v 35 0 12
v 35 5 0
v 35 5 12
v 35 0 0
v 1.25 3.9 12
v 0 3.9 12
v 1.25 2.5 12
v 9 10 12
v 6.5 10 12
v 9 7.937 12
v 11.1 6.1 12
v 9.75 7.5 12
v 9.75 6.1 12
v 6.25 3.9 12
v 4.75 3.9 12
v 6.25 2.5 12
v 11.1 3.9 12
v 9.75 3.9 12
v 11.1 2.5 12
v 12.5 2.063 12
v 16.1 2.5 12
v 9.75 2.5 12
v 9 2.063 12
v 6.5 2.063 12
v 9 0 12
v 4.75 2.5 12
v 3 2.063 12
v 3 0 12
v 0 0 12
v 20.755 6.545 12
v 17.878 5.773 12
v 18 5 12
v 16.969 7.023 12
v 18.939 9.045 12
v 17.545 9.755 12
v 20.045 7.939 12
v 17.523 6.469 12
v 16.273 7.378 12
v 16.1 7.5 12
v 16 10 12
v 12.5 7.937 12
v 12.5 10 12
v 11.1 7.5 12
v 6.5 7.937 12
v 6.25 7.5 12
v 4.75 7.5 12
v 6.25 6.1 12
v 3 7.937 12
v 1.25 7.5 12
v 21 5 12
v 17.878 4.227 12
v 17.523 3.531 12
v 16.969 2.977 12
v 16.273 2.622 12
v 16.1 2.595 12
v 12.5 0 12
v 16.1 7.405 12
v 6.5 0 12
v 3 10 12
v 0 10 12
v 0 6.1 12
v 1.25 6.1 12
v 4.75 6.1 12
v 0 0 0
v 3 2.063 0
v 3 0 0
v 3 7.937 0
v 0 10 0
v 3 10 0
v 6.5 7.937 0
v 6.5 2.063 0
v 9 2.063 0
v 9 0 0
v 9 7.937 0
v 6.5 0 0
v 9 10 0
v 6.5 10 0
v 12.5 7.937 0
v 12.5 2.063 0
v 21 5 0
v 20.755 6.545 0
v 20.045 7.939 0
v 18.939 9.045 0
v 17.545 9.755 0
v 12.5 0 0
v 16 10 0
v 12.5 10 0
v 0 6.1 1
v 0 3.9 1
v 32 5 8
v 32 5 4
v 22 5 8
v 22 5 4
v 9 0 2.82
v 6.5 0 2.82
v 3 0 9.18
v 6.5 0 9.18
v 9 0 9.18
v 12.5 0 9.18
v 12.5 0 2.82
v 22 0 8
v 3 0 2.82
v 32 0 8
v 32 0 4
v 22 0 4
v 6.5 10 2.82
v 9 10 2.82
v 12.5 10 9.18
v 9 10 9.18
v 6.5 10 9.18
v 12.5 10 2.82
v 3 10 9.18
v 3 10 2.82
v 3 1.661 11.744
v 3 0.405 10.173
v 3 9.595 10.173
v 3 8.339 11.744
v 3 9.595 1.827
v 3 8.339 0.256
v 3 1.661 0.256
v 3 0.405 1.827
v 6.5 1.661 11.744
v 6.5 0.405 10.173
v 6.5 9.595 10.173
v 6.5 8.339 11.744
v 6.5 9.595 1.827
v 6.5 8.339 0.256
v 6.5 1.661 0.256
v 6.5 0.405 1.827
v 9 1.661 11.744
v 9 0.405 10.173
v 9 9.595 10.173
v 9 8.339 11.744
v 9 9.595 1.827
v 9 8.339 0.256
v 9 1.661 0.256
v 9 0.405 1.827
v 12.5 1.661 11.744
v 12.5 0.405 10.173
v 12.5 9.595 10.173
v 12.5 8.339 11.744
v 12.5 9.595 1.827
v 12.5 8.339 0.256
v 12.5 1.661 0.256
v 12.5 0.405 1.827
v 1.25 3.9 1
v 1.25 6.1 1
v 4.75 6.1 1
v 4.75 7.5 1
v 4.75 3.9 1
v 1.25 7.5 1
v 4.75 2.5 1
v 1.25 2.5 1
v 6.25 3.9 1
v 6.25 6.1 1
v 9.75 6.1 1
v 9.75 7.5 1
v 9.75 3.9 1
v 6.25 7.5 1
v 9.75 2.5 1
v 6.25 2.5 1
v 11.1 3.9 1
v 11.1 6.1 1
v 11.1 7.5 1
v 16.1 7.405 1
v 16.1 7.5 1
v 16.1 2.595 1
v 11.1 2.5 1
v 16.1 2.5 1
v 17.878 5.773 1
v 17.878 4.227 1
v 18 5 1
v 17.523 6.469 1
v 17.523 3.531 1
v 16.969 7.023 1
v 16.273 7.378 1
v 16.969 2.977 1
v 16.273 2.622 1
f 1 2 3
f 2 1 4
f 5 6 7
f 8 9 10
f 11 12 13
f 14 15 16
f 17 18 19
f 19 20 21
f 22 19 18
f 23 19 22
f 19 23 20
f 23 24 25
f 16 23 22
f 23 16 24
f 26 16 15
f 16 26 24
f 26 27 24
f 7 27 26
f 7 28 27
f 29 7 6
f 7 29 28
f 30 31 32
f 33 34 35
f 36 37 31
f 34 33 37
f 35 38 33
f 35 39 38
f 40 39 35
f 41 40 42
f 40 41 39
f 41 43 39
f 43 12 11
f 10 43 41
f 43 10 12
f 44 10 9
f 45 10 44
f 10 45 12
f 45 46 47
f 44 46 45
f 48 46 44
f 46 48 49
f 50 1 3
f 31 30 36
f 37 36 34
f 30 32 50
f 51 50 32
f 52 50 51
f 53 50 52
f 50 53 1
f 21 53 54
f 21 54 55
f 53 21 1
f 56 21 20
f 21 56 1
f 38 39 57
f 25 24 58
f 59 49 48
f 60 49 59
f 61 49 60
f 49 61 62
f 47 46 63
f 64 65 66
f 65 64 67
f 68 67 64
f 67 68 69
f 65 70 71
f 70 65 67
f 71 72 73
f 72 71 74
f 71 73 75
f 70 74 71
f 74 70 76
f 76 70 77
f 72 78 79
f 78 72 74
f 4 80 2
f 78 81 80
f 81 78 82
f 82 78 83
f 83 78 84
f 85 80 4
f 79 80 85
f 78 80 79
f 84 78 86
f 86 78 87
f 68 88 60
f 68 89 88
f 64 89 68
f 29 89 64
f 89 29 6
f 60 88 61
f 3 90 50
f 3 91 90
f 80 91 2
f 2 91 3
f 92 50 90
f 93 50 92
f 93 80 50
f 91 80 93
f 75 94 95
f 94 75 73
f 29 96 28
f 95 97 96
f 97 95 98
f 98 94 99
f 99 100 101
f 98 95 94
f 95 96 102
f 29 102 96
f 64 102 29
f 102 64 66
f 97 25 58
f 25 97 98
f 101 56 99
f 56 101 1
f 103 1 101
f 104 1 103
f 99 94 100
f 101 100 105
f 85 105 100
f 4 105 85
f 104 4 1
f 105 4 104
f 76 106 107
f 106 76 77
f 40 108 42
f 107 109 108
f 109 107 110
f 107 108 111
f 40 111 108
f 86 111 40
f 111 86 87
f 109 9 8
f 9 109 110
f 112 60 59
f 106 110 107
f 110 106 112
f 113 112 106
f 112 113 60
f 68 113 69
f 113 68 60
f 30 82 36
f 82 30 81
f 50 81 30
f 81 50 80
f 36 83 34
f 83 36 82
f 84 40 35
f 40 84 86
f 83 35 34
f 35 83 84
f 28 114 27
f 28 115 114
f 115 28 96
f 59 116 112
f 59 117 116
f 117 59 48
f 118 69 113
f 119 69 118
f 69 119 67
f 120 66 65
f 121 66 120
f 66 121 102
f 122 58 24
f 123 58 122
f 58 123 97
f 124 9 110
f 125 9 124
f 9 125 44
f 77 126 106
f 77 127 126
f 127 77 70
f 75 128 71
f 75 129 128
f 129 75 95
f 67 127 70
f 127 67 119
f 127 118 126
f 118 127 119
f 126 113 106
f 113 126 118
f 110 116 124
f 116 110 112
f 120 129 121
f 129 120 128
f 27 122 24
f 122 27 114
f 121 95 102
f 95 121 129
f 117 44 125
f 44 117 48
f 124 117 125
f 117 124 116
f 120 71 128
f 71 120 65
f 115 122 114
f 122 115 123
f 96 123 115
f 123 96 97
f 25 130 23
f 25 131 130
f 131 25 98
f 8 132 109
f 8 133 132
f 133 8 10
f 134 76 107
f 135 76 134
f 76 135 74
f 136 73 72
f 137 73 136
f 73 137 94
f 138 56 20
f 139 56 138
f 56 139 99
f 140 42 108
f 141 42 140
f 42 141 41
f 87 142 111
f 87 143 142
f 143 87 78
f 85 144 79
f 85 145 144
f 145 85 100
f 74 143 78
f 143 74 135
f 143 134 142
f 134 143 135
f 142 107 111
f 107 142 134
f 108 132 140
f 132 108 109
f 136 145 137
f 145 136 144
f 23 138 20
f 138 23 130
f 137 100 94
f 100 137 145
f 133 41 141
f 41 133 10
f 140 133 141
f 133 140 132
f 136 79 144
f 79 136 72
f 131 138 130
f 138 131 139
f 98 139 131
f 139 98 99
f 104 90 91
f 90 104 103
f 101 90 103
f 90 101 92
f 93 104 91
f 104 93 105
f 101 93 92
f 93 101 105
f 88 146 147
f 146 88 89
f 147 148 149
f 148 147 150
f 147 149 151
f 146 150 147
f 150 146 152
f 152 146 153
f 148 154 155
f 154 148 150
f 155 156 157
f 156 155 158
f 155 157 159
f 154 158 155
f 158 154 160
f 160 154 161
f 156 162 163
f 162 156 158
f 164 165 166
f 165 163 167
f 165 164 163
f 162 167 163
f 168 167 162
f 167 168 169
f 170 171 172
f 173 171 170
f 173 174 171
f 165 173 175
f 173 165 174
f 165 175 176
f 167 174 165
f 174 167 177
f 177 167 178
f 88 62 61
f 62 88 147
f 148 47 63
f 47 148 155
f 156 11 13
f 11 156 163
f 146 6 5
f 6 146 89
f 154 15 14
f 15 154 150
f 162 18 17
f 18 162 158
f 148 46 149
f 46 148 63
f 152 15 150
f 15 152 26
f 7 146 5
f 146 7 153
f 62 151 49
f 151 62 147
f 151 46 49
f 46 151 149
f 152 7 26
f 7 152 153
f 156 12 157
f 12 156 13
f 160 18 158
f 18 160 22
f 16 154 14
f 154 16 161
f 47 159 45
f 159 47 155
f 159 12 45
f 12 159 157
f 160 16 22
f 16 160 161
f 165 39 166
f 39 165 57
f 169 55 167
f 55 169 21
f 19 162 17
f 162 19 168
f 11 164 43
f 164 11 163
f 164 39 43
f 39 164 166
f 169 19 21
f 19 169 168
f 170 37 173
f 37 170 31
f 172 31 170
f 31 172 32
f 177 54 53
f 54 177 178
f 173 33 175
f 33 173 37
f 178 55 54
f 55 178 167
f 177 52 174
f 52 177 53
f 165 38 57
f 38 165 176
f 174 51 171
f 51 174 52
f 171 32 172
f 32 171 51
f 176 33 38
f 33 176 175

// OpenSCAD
$fn=20;
//thickness of the belt
radius=2.5;

module zipholder(){
//cut parts of edges so zipties are firmly in place
translate([3,5,6])
rotate([0,90,0]){
scale([1,0.8,1]){
difference(){
cylinder(r=20, h=3.5);
translate([0,0,-1])cylinder(r=7.1, h=5);
}
}
}
}

difference(){
  union(){
    cube([35,5,12]);
    cube([16, 10, 12]);
    translate([16,5,0]) cylinder(r=5,h=12, $fn=20);
  }
  translate([27, 0,6])
    cube(size=[10,30,4], center=true);

  #translate([6.5,5,7])
    cube([17,2.2,12], center=true);

  translate([3,5,7])
    cube([radius*1.4, 2*radius, 12] , center=true);
  translate([8,5,7])
    //cylinder(r=radius, h=30);
    cube([radius*1.4, 2*radius, 12] , center=true);
  translate([13.6,5,7])
    cube([radius*2, 2*radius, 12], center=true);
  translate([15.5,5,1])
    #cylinder(r=radius, h=12);

  zipholder();
  translate([6,0,0])
    zipholder();



}
